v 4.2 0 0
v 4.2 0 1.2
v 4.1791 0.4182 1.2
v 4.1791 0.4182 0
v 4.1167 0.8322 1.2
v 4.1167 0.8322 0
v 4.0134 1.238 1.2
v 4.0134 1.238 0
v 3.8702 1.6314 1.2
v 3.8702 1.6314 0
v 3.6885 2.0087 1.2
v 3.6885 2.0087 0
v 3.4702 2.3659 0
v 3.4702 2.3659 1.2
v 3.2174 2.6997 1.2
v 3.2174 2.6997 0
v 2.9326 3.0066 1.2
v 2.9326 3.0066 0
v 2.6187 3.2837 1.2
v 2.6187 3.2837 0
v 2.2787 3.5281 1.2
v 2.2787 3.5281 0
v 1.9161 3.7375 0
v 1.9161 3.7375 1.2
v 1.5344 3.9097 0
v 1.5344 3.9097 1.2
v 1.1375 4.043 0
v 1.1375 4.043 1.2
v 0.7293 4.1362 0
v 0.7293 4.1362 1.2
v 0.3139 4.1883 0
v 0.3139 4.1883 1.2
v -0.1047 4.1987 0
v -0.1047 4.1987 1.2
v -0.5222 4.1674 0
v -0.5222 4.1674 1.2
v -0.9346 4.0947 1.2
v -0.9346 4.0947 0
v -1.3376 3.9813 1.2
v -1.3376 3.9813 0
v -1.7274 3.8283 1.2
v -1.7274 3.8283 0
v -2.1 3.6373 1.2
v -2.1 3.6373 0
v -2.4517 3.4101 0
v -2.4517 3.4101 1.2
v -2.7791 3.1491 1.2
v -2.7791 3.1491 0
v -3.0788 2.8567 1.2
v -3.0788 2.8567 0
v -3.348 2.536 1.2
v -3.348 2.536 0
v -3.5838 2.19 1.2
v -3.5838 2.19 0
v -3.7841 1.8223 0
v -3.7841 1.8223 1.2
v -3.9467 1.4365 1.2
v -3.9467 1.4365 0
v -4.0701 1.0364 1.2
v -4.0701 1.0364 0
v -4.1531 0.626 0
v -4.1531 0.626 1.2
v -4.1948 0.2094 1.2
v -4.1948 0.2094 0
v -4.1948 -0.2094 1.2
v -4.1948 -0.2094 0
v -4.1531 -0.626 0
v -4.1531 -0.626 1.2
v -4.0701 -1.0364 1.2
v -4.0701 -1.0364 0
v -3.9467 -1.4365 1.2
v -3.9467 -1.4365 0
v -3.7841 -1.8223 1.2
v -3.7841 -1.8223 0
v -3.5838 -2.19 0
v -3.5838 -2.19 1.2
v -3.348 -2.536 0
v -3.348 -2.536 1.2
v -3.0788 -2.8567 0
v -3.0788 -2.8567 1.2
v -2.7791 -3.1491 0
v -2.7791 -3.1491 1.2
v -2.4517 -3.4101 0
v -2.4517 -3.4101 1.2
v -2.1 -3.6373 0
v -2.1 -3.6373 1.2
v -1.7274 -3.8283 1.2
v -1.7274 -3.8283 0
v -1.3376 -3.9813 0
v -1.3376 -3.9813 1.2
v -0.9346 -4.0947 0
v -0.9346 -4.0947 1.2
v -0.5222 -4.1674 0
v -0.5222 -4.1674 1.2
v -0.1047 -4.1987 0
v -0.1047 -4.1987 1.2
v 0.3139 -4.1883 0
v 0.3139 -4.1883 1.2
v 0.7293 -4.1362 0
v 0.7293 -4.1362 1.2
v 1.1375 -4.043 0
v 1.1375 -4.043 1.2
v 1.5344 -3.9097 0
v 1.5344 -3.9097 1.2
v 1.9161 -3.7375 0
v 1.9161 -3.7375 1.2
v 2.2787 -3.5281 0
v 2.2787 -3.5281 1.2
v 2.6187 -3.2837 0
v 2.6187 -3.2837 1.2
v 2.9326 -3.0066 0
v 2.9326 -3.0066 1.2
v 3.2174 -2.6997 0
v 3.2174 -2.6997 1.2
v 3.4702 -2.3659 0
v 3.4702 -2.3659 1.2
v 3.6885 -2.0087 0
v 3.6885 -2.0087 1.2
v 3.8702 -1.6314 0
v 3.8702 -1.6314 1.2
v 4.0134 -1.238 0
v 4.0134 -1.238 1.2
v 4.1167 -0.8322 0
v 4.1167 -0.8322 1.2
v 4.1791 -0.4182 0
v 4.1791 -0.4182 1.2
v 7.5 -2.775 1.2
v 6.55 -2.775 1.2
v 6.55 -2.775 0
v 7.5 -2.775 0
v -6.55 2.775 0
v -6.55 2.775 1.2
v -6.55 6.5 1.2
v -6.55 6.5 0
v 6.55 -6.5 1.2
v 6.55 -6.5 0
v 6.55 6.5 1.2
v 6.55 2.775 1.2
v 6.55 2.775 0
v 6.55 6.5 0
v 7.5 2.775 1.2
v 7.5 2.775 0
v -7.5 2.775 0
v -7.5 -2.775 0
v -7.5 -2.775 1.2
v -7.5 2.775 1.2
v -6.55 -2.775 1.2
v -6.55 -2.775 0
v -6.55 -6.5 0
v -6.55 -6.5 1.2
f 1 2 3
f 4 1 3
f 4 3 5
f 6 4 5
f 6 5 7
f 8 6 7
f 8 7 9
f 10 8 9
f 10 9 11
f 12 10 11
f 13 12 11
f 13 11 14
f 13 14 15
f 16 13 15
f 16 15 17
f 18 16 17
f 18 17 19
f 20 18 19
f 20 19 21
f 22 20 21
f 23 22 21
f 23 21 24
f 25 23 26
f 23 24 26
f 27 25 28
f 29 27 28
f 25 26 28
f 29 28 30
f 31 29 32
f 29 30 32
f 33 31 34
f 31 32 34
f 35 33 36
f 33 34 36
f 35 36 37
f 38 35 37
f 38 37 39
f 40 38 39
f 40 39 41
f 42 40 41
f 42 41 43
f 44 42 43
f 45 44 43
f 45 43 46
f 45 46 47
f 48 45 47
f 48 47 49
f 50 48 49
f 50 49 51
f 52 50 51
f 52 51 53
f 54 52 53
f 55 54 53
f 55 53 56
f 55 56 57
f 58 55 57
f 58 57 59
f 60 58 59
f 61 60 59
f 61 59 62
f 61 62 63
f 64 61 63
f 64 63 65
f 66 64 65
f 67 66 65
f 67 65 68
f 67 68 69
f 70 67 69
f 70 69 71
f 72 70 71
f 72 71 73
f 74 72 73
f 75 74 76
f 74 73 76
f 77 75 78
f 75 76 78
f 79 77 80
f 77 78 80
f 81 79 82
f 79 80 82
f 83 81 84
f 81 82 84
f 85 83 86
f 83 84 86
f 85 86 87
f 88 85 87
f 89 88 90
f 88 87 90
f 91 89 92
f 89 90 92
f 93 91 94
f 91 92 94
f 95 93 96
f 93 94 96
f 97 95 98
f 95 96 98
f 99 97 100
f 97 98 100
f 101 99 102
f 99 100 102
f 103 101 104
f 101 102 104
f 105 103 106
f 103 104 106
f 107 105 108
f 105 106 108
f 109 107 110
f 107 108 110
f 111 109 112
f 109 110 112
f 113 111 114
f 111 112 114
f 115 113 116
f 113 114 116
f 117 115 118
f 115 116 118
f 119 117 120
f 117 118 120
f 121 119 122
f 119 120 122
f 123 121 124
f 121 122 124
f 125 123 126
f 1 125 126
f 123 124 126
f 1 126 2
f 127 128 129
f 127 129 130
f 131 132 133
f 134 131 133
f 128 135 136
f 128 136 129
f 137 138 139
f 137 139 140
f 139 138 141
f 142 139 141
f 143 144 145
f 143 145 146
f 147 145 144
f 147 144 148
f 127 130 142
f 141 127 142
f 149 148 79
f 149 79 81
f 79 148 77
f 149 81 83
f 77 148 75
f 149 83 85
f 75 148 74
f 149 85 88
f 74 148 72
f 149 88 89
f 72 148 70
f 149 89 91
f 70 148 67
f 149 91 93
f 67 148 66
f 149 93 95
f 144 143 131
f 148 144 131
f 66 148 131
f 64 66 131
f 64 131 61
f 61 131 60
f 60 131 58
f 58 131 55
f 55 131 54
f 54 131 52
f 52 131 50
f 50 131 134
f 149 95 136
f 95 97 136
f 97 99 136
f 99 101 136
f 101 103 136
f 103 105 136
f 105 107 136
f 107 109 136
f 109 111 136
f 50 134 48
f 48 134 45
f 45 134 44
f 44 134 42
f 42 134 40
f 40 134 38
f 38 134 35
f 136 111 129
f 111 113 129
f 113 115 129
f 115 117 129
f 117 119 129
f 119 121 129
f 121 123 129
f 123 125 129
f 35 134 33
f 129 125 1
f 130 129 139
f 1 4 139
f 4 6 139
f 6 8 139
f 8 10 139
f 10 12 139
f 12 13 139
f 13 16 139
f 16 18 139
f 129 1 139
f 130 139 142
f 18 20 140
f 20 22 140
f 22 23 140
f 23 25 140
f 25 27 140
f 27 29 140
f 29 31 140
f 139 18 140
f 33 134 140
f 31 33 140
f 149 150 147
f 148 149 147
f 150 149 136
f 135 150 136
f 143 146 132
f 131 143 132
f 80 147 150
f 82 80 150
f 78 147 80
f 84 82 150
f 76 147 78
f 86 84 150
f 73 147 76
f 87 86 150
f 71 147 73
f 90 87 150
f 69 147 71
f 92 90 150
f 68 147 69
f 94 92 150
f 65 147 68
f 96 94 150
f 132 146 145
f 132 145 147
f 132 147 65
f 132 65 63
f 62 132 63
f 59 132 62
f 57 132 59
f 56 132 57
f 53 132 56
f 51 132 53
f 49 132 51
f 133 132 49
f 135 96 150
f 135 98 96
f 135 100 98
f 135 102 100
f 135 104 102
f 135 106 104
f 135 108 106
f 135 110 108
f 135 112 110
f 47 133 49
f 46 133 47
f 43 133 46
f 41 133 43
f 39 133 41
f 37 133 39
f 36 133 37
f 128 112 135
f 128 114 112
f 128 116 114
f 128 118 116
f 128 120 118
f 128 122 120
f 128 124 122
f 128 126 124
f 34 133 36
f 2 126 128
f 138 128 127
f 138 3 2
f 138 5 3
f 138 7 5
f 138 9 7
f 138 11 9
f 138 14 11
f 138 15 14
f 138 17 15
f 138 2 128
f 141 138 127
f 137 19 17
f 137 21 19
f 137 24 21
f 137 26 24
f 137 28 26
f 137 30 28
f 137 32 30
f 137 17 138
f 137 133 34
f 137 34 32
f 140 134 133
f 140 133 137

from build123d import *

# Parameters (mm, degrees)
CROQUIS1_W              = 15
CROQUIS1_H              = 13
SALIENTE_EXTRUIR1_DEPTH = 1.2
CORTAR_EXTRUIR1_REACH   = 3.2
CROQUIS2_W              = 0.95
CROQUIS2_H              = 3.725
CORTAR_EXTRUIR2_REACH   = 3.2
CROQUIS3_R              = 4.2


with BuildPart() as part:
    # Croquis1 → Saliente-Extruir1 (new body)
    with BuildSketch(Plane.XY):
        Rectangle(CROQUIS1_W, CROQUIS1_H)
    extrude(amount=SALIENTE_EXTRUIR1_DEPTH)

    # Croquis2 → Cortar-Extruir1 (cut, up to next)
    with BuildSketch(Plane.XY.offset(1.2), mode=Mode.PRIVATE) as cortar_extruir1_sk1:
        with Locations((7.025, 4.6375)):
            Rectangle(CROQUIS2_W, CROQUIS2_H)
    cortar_extruir1_tool1 = extrude(cortar_extruir1_sk1.sketch, amount=-CORTAR_EXTRUIR1_REACH, mode=Mode.PRIVATE) & part.part
    add(cortar_extruir1_tool1.solids().sort_by_distance((7.025, 4.6375, 1.2))[0], mode=Mode.SUBTRACT)
    # Croquis2 → Cortar-Extruir1 (cut, up to next)
    with BuildSketch(Plane.XY.offset(1.2), mode=Mode.PRIVATE) as cortar_extruir1_sk2:
        with Locations((7.025, -4.6375)):
            Rectangle(CROQUIS2_W, CROQUIS2_H)
    cortar_extruir1_tool2 = extrude(cortar_extruir1_sk2.sketch, amount=-CORTAR_EXTRUIR1_REACH, mode=Mode.PRIVATE) & part.part
    add(cortar_extruir1_tool2.solids().sort_by_distance((7.025, -4.6375, 1.2))[0], mode=Mode.SUBTRACT)
    # Croquis2 → Cortar-Extruir1 (cut, up to next)
    with BuildSketch(Plane.XY.offset(1.2), mode=Mode.PRIVATE) as cortar_extruir1_sk3:
        with Locations((-7.025, -4.6375)):
            Rectangle(CROQUIS2_W, CROQUIS2_H)
    cortar_extruir1_tool3 = extrude(cortar_extruir1_sk3.sketch, amount=-CORTAR_EXTRUIR1_REACH, mode=Mode.PRIVATE) & part.part
    add(cortar_extruir1_tool3.solids().sort_by_distance((-7.025, -4.6375, 1.2))[0], mode=Mode.SUBTRACT)
    # Croquis2 → Cortar-Extruir1 (cut, up to next)
    with BuildSketch(Plane.XY.offset(1.2), mode=Mode.PRIVATE) as cortar_extruir1_sk4:
        with Locations((-7.025, 4.6375)):
            Rectangle(CROQUIS2_W, CROQUIS2_H)
    cortar_extruir1_tool4 = extrude(cortar_extruir1_sk4.sketch, amount=-CORTAR_EXTRUIR1_REACH, mode=Mode.PRIVATE) & part.part
    add(cortar_extruir1_tool4.solids().sort_by_distance((-7.025, 4.6375, 1.2))[0], mode=Mode.SUBTRACT)

    # Croquis3 → Cortar-Extruir2 (cut, up to next)
    with BuildSketch(Plane.XY.offset(1.2), mode=Mode.PRIVATE) as cortar_extruir2_sk1:
        Circle(CROQUIS3_R)
    cortar_extruir2_tool1 = extrude(cortar_extruir2_sk1.sketch, amount=-CORTAR_EXTRUIR2_REACH, mode=Mode.PRIVATE) & part.part
    add(cortar_extruir2_tool1.solids().sort_by_distance((0, 0, 1.2))[0], mode=Mode.SUBTRACT)


solid = part.part
